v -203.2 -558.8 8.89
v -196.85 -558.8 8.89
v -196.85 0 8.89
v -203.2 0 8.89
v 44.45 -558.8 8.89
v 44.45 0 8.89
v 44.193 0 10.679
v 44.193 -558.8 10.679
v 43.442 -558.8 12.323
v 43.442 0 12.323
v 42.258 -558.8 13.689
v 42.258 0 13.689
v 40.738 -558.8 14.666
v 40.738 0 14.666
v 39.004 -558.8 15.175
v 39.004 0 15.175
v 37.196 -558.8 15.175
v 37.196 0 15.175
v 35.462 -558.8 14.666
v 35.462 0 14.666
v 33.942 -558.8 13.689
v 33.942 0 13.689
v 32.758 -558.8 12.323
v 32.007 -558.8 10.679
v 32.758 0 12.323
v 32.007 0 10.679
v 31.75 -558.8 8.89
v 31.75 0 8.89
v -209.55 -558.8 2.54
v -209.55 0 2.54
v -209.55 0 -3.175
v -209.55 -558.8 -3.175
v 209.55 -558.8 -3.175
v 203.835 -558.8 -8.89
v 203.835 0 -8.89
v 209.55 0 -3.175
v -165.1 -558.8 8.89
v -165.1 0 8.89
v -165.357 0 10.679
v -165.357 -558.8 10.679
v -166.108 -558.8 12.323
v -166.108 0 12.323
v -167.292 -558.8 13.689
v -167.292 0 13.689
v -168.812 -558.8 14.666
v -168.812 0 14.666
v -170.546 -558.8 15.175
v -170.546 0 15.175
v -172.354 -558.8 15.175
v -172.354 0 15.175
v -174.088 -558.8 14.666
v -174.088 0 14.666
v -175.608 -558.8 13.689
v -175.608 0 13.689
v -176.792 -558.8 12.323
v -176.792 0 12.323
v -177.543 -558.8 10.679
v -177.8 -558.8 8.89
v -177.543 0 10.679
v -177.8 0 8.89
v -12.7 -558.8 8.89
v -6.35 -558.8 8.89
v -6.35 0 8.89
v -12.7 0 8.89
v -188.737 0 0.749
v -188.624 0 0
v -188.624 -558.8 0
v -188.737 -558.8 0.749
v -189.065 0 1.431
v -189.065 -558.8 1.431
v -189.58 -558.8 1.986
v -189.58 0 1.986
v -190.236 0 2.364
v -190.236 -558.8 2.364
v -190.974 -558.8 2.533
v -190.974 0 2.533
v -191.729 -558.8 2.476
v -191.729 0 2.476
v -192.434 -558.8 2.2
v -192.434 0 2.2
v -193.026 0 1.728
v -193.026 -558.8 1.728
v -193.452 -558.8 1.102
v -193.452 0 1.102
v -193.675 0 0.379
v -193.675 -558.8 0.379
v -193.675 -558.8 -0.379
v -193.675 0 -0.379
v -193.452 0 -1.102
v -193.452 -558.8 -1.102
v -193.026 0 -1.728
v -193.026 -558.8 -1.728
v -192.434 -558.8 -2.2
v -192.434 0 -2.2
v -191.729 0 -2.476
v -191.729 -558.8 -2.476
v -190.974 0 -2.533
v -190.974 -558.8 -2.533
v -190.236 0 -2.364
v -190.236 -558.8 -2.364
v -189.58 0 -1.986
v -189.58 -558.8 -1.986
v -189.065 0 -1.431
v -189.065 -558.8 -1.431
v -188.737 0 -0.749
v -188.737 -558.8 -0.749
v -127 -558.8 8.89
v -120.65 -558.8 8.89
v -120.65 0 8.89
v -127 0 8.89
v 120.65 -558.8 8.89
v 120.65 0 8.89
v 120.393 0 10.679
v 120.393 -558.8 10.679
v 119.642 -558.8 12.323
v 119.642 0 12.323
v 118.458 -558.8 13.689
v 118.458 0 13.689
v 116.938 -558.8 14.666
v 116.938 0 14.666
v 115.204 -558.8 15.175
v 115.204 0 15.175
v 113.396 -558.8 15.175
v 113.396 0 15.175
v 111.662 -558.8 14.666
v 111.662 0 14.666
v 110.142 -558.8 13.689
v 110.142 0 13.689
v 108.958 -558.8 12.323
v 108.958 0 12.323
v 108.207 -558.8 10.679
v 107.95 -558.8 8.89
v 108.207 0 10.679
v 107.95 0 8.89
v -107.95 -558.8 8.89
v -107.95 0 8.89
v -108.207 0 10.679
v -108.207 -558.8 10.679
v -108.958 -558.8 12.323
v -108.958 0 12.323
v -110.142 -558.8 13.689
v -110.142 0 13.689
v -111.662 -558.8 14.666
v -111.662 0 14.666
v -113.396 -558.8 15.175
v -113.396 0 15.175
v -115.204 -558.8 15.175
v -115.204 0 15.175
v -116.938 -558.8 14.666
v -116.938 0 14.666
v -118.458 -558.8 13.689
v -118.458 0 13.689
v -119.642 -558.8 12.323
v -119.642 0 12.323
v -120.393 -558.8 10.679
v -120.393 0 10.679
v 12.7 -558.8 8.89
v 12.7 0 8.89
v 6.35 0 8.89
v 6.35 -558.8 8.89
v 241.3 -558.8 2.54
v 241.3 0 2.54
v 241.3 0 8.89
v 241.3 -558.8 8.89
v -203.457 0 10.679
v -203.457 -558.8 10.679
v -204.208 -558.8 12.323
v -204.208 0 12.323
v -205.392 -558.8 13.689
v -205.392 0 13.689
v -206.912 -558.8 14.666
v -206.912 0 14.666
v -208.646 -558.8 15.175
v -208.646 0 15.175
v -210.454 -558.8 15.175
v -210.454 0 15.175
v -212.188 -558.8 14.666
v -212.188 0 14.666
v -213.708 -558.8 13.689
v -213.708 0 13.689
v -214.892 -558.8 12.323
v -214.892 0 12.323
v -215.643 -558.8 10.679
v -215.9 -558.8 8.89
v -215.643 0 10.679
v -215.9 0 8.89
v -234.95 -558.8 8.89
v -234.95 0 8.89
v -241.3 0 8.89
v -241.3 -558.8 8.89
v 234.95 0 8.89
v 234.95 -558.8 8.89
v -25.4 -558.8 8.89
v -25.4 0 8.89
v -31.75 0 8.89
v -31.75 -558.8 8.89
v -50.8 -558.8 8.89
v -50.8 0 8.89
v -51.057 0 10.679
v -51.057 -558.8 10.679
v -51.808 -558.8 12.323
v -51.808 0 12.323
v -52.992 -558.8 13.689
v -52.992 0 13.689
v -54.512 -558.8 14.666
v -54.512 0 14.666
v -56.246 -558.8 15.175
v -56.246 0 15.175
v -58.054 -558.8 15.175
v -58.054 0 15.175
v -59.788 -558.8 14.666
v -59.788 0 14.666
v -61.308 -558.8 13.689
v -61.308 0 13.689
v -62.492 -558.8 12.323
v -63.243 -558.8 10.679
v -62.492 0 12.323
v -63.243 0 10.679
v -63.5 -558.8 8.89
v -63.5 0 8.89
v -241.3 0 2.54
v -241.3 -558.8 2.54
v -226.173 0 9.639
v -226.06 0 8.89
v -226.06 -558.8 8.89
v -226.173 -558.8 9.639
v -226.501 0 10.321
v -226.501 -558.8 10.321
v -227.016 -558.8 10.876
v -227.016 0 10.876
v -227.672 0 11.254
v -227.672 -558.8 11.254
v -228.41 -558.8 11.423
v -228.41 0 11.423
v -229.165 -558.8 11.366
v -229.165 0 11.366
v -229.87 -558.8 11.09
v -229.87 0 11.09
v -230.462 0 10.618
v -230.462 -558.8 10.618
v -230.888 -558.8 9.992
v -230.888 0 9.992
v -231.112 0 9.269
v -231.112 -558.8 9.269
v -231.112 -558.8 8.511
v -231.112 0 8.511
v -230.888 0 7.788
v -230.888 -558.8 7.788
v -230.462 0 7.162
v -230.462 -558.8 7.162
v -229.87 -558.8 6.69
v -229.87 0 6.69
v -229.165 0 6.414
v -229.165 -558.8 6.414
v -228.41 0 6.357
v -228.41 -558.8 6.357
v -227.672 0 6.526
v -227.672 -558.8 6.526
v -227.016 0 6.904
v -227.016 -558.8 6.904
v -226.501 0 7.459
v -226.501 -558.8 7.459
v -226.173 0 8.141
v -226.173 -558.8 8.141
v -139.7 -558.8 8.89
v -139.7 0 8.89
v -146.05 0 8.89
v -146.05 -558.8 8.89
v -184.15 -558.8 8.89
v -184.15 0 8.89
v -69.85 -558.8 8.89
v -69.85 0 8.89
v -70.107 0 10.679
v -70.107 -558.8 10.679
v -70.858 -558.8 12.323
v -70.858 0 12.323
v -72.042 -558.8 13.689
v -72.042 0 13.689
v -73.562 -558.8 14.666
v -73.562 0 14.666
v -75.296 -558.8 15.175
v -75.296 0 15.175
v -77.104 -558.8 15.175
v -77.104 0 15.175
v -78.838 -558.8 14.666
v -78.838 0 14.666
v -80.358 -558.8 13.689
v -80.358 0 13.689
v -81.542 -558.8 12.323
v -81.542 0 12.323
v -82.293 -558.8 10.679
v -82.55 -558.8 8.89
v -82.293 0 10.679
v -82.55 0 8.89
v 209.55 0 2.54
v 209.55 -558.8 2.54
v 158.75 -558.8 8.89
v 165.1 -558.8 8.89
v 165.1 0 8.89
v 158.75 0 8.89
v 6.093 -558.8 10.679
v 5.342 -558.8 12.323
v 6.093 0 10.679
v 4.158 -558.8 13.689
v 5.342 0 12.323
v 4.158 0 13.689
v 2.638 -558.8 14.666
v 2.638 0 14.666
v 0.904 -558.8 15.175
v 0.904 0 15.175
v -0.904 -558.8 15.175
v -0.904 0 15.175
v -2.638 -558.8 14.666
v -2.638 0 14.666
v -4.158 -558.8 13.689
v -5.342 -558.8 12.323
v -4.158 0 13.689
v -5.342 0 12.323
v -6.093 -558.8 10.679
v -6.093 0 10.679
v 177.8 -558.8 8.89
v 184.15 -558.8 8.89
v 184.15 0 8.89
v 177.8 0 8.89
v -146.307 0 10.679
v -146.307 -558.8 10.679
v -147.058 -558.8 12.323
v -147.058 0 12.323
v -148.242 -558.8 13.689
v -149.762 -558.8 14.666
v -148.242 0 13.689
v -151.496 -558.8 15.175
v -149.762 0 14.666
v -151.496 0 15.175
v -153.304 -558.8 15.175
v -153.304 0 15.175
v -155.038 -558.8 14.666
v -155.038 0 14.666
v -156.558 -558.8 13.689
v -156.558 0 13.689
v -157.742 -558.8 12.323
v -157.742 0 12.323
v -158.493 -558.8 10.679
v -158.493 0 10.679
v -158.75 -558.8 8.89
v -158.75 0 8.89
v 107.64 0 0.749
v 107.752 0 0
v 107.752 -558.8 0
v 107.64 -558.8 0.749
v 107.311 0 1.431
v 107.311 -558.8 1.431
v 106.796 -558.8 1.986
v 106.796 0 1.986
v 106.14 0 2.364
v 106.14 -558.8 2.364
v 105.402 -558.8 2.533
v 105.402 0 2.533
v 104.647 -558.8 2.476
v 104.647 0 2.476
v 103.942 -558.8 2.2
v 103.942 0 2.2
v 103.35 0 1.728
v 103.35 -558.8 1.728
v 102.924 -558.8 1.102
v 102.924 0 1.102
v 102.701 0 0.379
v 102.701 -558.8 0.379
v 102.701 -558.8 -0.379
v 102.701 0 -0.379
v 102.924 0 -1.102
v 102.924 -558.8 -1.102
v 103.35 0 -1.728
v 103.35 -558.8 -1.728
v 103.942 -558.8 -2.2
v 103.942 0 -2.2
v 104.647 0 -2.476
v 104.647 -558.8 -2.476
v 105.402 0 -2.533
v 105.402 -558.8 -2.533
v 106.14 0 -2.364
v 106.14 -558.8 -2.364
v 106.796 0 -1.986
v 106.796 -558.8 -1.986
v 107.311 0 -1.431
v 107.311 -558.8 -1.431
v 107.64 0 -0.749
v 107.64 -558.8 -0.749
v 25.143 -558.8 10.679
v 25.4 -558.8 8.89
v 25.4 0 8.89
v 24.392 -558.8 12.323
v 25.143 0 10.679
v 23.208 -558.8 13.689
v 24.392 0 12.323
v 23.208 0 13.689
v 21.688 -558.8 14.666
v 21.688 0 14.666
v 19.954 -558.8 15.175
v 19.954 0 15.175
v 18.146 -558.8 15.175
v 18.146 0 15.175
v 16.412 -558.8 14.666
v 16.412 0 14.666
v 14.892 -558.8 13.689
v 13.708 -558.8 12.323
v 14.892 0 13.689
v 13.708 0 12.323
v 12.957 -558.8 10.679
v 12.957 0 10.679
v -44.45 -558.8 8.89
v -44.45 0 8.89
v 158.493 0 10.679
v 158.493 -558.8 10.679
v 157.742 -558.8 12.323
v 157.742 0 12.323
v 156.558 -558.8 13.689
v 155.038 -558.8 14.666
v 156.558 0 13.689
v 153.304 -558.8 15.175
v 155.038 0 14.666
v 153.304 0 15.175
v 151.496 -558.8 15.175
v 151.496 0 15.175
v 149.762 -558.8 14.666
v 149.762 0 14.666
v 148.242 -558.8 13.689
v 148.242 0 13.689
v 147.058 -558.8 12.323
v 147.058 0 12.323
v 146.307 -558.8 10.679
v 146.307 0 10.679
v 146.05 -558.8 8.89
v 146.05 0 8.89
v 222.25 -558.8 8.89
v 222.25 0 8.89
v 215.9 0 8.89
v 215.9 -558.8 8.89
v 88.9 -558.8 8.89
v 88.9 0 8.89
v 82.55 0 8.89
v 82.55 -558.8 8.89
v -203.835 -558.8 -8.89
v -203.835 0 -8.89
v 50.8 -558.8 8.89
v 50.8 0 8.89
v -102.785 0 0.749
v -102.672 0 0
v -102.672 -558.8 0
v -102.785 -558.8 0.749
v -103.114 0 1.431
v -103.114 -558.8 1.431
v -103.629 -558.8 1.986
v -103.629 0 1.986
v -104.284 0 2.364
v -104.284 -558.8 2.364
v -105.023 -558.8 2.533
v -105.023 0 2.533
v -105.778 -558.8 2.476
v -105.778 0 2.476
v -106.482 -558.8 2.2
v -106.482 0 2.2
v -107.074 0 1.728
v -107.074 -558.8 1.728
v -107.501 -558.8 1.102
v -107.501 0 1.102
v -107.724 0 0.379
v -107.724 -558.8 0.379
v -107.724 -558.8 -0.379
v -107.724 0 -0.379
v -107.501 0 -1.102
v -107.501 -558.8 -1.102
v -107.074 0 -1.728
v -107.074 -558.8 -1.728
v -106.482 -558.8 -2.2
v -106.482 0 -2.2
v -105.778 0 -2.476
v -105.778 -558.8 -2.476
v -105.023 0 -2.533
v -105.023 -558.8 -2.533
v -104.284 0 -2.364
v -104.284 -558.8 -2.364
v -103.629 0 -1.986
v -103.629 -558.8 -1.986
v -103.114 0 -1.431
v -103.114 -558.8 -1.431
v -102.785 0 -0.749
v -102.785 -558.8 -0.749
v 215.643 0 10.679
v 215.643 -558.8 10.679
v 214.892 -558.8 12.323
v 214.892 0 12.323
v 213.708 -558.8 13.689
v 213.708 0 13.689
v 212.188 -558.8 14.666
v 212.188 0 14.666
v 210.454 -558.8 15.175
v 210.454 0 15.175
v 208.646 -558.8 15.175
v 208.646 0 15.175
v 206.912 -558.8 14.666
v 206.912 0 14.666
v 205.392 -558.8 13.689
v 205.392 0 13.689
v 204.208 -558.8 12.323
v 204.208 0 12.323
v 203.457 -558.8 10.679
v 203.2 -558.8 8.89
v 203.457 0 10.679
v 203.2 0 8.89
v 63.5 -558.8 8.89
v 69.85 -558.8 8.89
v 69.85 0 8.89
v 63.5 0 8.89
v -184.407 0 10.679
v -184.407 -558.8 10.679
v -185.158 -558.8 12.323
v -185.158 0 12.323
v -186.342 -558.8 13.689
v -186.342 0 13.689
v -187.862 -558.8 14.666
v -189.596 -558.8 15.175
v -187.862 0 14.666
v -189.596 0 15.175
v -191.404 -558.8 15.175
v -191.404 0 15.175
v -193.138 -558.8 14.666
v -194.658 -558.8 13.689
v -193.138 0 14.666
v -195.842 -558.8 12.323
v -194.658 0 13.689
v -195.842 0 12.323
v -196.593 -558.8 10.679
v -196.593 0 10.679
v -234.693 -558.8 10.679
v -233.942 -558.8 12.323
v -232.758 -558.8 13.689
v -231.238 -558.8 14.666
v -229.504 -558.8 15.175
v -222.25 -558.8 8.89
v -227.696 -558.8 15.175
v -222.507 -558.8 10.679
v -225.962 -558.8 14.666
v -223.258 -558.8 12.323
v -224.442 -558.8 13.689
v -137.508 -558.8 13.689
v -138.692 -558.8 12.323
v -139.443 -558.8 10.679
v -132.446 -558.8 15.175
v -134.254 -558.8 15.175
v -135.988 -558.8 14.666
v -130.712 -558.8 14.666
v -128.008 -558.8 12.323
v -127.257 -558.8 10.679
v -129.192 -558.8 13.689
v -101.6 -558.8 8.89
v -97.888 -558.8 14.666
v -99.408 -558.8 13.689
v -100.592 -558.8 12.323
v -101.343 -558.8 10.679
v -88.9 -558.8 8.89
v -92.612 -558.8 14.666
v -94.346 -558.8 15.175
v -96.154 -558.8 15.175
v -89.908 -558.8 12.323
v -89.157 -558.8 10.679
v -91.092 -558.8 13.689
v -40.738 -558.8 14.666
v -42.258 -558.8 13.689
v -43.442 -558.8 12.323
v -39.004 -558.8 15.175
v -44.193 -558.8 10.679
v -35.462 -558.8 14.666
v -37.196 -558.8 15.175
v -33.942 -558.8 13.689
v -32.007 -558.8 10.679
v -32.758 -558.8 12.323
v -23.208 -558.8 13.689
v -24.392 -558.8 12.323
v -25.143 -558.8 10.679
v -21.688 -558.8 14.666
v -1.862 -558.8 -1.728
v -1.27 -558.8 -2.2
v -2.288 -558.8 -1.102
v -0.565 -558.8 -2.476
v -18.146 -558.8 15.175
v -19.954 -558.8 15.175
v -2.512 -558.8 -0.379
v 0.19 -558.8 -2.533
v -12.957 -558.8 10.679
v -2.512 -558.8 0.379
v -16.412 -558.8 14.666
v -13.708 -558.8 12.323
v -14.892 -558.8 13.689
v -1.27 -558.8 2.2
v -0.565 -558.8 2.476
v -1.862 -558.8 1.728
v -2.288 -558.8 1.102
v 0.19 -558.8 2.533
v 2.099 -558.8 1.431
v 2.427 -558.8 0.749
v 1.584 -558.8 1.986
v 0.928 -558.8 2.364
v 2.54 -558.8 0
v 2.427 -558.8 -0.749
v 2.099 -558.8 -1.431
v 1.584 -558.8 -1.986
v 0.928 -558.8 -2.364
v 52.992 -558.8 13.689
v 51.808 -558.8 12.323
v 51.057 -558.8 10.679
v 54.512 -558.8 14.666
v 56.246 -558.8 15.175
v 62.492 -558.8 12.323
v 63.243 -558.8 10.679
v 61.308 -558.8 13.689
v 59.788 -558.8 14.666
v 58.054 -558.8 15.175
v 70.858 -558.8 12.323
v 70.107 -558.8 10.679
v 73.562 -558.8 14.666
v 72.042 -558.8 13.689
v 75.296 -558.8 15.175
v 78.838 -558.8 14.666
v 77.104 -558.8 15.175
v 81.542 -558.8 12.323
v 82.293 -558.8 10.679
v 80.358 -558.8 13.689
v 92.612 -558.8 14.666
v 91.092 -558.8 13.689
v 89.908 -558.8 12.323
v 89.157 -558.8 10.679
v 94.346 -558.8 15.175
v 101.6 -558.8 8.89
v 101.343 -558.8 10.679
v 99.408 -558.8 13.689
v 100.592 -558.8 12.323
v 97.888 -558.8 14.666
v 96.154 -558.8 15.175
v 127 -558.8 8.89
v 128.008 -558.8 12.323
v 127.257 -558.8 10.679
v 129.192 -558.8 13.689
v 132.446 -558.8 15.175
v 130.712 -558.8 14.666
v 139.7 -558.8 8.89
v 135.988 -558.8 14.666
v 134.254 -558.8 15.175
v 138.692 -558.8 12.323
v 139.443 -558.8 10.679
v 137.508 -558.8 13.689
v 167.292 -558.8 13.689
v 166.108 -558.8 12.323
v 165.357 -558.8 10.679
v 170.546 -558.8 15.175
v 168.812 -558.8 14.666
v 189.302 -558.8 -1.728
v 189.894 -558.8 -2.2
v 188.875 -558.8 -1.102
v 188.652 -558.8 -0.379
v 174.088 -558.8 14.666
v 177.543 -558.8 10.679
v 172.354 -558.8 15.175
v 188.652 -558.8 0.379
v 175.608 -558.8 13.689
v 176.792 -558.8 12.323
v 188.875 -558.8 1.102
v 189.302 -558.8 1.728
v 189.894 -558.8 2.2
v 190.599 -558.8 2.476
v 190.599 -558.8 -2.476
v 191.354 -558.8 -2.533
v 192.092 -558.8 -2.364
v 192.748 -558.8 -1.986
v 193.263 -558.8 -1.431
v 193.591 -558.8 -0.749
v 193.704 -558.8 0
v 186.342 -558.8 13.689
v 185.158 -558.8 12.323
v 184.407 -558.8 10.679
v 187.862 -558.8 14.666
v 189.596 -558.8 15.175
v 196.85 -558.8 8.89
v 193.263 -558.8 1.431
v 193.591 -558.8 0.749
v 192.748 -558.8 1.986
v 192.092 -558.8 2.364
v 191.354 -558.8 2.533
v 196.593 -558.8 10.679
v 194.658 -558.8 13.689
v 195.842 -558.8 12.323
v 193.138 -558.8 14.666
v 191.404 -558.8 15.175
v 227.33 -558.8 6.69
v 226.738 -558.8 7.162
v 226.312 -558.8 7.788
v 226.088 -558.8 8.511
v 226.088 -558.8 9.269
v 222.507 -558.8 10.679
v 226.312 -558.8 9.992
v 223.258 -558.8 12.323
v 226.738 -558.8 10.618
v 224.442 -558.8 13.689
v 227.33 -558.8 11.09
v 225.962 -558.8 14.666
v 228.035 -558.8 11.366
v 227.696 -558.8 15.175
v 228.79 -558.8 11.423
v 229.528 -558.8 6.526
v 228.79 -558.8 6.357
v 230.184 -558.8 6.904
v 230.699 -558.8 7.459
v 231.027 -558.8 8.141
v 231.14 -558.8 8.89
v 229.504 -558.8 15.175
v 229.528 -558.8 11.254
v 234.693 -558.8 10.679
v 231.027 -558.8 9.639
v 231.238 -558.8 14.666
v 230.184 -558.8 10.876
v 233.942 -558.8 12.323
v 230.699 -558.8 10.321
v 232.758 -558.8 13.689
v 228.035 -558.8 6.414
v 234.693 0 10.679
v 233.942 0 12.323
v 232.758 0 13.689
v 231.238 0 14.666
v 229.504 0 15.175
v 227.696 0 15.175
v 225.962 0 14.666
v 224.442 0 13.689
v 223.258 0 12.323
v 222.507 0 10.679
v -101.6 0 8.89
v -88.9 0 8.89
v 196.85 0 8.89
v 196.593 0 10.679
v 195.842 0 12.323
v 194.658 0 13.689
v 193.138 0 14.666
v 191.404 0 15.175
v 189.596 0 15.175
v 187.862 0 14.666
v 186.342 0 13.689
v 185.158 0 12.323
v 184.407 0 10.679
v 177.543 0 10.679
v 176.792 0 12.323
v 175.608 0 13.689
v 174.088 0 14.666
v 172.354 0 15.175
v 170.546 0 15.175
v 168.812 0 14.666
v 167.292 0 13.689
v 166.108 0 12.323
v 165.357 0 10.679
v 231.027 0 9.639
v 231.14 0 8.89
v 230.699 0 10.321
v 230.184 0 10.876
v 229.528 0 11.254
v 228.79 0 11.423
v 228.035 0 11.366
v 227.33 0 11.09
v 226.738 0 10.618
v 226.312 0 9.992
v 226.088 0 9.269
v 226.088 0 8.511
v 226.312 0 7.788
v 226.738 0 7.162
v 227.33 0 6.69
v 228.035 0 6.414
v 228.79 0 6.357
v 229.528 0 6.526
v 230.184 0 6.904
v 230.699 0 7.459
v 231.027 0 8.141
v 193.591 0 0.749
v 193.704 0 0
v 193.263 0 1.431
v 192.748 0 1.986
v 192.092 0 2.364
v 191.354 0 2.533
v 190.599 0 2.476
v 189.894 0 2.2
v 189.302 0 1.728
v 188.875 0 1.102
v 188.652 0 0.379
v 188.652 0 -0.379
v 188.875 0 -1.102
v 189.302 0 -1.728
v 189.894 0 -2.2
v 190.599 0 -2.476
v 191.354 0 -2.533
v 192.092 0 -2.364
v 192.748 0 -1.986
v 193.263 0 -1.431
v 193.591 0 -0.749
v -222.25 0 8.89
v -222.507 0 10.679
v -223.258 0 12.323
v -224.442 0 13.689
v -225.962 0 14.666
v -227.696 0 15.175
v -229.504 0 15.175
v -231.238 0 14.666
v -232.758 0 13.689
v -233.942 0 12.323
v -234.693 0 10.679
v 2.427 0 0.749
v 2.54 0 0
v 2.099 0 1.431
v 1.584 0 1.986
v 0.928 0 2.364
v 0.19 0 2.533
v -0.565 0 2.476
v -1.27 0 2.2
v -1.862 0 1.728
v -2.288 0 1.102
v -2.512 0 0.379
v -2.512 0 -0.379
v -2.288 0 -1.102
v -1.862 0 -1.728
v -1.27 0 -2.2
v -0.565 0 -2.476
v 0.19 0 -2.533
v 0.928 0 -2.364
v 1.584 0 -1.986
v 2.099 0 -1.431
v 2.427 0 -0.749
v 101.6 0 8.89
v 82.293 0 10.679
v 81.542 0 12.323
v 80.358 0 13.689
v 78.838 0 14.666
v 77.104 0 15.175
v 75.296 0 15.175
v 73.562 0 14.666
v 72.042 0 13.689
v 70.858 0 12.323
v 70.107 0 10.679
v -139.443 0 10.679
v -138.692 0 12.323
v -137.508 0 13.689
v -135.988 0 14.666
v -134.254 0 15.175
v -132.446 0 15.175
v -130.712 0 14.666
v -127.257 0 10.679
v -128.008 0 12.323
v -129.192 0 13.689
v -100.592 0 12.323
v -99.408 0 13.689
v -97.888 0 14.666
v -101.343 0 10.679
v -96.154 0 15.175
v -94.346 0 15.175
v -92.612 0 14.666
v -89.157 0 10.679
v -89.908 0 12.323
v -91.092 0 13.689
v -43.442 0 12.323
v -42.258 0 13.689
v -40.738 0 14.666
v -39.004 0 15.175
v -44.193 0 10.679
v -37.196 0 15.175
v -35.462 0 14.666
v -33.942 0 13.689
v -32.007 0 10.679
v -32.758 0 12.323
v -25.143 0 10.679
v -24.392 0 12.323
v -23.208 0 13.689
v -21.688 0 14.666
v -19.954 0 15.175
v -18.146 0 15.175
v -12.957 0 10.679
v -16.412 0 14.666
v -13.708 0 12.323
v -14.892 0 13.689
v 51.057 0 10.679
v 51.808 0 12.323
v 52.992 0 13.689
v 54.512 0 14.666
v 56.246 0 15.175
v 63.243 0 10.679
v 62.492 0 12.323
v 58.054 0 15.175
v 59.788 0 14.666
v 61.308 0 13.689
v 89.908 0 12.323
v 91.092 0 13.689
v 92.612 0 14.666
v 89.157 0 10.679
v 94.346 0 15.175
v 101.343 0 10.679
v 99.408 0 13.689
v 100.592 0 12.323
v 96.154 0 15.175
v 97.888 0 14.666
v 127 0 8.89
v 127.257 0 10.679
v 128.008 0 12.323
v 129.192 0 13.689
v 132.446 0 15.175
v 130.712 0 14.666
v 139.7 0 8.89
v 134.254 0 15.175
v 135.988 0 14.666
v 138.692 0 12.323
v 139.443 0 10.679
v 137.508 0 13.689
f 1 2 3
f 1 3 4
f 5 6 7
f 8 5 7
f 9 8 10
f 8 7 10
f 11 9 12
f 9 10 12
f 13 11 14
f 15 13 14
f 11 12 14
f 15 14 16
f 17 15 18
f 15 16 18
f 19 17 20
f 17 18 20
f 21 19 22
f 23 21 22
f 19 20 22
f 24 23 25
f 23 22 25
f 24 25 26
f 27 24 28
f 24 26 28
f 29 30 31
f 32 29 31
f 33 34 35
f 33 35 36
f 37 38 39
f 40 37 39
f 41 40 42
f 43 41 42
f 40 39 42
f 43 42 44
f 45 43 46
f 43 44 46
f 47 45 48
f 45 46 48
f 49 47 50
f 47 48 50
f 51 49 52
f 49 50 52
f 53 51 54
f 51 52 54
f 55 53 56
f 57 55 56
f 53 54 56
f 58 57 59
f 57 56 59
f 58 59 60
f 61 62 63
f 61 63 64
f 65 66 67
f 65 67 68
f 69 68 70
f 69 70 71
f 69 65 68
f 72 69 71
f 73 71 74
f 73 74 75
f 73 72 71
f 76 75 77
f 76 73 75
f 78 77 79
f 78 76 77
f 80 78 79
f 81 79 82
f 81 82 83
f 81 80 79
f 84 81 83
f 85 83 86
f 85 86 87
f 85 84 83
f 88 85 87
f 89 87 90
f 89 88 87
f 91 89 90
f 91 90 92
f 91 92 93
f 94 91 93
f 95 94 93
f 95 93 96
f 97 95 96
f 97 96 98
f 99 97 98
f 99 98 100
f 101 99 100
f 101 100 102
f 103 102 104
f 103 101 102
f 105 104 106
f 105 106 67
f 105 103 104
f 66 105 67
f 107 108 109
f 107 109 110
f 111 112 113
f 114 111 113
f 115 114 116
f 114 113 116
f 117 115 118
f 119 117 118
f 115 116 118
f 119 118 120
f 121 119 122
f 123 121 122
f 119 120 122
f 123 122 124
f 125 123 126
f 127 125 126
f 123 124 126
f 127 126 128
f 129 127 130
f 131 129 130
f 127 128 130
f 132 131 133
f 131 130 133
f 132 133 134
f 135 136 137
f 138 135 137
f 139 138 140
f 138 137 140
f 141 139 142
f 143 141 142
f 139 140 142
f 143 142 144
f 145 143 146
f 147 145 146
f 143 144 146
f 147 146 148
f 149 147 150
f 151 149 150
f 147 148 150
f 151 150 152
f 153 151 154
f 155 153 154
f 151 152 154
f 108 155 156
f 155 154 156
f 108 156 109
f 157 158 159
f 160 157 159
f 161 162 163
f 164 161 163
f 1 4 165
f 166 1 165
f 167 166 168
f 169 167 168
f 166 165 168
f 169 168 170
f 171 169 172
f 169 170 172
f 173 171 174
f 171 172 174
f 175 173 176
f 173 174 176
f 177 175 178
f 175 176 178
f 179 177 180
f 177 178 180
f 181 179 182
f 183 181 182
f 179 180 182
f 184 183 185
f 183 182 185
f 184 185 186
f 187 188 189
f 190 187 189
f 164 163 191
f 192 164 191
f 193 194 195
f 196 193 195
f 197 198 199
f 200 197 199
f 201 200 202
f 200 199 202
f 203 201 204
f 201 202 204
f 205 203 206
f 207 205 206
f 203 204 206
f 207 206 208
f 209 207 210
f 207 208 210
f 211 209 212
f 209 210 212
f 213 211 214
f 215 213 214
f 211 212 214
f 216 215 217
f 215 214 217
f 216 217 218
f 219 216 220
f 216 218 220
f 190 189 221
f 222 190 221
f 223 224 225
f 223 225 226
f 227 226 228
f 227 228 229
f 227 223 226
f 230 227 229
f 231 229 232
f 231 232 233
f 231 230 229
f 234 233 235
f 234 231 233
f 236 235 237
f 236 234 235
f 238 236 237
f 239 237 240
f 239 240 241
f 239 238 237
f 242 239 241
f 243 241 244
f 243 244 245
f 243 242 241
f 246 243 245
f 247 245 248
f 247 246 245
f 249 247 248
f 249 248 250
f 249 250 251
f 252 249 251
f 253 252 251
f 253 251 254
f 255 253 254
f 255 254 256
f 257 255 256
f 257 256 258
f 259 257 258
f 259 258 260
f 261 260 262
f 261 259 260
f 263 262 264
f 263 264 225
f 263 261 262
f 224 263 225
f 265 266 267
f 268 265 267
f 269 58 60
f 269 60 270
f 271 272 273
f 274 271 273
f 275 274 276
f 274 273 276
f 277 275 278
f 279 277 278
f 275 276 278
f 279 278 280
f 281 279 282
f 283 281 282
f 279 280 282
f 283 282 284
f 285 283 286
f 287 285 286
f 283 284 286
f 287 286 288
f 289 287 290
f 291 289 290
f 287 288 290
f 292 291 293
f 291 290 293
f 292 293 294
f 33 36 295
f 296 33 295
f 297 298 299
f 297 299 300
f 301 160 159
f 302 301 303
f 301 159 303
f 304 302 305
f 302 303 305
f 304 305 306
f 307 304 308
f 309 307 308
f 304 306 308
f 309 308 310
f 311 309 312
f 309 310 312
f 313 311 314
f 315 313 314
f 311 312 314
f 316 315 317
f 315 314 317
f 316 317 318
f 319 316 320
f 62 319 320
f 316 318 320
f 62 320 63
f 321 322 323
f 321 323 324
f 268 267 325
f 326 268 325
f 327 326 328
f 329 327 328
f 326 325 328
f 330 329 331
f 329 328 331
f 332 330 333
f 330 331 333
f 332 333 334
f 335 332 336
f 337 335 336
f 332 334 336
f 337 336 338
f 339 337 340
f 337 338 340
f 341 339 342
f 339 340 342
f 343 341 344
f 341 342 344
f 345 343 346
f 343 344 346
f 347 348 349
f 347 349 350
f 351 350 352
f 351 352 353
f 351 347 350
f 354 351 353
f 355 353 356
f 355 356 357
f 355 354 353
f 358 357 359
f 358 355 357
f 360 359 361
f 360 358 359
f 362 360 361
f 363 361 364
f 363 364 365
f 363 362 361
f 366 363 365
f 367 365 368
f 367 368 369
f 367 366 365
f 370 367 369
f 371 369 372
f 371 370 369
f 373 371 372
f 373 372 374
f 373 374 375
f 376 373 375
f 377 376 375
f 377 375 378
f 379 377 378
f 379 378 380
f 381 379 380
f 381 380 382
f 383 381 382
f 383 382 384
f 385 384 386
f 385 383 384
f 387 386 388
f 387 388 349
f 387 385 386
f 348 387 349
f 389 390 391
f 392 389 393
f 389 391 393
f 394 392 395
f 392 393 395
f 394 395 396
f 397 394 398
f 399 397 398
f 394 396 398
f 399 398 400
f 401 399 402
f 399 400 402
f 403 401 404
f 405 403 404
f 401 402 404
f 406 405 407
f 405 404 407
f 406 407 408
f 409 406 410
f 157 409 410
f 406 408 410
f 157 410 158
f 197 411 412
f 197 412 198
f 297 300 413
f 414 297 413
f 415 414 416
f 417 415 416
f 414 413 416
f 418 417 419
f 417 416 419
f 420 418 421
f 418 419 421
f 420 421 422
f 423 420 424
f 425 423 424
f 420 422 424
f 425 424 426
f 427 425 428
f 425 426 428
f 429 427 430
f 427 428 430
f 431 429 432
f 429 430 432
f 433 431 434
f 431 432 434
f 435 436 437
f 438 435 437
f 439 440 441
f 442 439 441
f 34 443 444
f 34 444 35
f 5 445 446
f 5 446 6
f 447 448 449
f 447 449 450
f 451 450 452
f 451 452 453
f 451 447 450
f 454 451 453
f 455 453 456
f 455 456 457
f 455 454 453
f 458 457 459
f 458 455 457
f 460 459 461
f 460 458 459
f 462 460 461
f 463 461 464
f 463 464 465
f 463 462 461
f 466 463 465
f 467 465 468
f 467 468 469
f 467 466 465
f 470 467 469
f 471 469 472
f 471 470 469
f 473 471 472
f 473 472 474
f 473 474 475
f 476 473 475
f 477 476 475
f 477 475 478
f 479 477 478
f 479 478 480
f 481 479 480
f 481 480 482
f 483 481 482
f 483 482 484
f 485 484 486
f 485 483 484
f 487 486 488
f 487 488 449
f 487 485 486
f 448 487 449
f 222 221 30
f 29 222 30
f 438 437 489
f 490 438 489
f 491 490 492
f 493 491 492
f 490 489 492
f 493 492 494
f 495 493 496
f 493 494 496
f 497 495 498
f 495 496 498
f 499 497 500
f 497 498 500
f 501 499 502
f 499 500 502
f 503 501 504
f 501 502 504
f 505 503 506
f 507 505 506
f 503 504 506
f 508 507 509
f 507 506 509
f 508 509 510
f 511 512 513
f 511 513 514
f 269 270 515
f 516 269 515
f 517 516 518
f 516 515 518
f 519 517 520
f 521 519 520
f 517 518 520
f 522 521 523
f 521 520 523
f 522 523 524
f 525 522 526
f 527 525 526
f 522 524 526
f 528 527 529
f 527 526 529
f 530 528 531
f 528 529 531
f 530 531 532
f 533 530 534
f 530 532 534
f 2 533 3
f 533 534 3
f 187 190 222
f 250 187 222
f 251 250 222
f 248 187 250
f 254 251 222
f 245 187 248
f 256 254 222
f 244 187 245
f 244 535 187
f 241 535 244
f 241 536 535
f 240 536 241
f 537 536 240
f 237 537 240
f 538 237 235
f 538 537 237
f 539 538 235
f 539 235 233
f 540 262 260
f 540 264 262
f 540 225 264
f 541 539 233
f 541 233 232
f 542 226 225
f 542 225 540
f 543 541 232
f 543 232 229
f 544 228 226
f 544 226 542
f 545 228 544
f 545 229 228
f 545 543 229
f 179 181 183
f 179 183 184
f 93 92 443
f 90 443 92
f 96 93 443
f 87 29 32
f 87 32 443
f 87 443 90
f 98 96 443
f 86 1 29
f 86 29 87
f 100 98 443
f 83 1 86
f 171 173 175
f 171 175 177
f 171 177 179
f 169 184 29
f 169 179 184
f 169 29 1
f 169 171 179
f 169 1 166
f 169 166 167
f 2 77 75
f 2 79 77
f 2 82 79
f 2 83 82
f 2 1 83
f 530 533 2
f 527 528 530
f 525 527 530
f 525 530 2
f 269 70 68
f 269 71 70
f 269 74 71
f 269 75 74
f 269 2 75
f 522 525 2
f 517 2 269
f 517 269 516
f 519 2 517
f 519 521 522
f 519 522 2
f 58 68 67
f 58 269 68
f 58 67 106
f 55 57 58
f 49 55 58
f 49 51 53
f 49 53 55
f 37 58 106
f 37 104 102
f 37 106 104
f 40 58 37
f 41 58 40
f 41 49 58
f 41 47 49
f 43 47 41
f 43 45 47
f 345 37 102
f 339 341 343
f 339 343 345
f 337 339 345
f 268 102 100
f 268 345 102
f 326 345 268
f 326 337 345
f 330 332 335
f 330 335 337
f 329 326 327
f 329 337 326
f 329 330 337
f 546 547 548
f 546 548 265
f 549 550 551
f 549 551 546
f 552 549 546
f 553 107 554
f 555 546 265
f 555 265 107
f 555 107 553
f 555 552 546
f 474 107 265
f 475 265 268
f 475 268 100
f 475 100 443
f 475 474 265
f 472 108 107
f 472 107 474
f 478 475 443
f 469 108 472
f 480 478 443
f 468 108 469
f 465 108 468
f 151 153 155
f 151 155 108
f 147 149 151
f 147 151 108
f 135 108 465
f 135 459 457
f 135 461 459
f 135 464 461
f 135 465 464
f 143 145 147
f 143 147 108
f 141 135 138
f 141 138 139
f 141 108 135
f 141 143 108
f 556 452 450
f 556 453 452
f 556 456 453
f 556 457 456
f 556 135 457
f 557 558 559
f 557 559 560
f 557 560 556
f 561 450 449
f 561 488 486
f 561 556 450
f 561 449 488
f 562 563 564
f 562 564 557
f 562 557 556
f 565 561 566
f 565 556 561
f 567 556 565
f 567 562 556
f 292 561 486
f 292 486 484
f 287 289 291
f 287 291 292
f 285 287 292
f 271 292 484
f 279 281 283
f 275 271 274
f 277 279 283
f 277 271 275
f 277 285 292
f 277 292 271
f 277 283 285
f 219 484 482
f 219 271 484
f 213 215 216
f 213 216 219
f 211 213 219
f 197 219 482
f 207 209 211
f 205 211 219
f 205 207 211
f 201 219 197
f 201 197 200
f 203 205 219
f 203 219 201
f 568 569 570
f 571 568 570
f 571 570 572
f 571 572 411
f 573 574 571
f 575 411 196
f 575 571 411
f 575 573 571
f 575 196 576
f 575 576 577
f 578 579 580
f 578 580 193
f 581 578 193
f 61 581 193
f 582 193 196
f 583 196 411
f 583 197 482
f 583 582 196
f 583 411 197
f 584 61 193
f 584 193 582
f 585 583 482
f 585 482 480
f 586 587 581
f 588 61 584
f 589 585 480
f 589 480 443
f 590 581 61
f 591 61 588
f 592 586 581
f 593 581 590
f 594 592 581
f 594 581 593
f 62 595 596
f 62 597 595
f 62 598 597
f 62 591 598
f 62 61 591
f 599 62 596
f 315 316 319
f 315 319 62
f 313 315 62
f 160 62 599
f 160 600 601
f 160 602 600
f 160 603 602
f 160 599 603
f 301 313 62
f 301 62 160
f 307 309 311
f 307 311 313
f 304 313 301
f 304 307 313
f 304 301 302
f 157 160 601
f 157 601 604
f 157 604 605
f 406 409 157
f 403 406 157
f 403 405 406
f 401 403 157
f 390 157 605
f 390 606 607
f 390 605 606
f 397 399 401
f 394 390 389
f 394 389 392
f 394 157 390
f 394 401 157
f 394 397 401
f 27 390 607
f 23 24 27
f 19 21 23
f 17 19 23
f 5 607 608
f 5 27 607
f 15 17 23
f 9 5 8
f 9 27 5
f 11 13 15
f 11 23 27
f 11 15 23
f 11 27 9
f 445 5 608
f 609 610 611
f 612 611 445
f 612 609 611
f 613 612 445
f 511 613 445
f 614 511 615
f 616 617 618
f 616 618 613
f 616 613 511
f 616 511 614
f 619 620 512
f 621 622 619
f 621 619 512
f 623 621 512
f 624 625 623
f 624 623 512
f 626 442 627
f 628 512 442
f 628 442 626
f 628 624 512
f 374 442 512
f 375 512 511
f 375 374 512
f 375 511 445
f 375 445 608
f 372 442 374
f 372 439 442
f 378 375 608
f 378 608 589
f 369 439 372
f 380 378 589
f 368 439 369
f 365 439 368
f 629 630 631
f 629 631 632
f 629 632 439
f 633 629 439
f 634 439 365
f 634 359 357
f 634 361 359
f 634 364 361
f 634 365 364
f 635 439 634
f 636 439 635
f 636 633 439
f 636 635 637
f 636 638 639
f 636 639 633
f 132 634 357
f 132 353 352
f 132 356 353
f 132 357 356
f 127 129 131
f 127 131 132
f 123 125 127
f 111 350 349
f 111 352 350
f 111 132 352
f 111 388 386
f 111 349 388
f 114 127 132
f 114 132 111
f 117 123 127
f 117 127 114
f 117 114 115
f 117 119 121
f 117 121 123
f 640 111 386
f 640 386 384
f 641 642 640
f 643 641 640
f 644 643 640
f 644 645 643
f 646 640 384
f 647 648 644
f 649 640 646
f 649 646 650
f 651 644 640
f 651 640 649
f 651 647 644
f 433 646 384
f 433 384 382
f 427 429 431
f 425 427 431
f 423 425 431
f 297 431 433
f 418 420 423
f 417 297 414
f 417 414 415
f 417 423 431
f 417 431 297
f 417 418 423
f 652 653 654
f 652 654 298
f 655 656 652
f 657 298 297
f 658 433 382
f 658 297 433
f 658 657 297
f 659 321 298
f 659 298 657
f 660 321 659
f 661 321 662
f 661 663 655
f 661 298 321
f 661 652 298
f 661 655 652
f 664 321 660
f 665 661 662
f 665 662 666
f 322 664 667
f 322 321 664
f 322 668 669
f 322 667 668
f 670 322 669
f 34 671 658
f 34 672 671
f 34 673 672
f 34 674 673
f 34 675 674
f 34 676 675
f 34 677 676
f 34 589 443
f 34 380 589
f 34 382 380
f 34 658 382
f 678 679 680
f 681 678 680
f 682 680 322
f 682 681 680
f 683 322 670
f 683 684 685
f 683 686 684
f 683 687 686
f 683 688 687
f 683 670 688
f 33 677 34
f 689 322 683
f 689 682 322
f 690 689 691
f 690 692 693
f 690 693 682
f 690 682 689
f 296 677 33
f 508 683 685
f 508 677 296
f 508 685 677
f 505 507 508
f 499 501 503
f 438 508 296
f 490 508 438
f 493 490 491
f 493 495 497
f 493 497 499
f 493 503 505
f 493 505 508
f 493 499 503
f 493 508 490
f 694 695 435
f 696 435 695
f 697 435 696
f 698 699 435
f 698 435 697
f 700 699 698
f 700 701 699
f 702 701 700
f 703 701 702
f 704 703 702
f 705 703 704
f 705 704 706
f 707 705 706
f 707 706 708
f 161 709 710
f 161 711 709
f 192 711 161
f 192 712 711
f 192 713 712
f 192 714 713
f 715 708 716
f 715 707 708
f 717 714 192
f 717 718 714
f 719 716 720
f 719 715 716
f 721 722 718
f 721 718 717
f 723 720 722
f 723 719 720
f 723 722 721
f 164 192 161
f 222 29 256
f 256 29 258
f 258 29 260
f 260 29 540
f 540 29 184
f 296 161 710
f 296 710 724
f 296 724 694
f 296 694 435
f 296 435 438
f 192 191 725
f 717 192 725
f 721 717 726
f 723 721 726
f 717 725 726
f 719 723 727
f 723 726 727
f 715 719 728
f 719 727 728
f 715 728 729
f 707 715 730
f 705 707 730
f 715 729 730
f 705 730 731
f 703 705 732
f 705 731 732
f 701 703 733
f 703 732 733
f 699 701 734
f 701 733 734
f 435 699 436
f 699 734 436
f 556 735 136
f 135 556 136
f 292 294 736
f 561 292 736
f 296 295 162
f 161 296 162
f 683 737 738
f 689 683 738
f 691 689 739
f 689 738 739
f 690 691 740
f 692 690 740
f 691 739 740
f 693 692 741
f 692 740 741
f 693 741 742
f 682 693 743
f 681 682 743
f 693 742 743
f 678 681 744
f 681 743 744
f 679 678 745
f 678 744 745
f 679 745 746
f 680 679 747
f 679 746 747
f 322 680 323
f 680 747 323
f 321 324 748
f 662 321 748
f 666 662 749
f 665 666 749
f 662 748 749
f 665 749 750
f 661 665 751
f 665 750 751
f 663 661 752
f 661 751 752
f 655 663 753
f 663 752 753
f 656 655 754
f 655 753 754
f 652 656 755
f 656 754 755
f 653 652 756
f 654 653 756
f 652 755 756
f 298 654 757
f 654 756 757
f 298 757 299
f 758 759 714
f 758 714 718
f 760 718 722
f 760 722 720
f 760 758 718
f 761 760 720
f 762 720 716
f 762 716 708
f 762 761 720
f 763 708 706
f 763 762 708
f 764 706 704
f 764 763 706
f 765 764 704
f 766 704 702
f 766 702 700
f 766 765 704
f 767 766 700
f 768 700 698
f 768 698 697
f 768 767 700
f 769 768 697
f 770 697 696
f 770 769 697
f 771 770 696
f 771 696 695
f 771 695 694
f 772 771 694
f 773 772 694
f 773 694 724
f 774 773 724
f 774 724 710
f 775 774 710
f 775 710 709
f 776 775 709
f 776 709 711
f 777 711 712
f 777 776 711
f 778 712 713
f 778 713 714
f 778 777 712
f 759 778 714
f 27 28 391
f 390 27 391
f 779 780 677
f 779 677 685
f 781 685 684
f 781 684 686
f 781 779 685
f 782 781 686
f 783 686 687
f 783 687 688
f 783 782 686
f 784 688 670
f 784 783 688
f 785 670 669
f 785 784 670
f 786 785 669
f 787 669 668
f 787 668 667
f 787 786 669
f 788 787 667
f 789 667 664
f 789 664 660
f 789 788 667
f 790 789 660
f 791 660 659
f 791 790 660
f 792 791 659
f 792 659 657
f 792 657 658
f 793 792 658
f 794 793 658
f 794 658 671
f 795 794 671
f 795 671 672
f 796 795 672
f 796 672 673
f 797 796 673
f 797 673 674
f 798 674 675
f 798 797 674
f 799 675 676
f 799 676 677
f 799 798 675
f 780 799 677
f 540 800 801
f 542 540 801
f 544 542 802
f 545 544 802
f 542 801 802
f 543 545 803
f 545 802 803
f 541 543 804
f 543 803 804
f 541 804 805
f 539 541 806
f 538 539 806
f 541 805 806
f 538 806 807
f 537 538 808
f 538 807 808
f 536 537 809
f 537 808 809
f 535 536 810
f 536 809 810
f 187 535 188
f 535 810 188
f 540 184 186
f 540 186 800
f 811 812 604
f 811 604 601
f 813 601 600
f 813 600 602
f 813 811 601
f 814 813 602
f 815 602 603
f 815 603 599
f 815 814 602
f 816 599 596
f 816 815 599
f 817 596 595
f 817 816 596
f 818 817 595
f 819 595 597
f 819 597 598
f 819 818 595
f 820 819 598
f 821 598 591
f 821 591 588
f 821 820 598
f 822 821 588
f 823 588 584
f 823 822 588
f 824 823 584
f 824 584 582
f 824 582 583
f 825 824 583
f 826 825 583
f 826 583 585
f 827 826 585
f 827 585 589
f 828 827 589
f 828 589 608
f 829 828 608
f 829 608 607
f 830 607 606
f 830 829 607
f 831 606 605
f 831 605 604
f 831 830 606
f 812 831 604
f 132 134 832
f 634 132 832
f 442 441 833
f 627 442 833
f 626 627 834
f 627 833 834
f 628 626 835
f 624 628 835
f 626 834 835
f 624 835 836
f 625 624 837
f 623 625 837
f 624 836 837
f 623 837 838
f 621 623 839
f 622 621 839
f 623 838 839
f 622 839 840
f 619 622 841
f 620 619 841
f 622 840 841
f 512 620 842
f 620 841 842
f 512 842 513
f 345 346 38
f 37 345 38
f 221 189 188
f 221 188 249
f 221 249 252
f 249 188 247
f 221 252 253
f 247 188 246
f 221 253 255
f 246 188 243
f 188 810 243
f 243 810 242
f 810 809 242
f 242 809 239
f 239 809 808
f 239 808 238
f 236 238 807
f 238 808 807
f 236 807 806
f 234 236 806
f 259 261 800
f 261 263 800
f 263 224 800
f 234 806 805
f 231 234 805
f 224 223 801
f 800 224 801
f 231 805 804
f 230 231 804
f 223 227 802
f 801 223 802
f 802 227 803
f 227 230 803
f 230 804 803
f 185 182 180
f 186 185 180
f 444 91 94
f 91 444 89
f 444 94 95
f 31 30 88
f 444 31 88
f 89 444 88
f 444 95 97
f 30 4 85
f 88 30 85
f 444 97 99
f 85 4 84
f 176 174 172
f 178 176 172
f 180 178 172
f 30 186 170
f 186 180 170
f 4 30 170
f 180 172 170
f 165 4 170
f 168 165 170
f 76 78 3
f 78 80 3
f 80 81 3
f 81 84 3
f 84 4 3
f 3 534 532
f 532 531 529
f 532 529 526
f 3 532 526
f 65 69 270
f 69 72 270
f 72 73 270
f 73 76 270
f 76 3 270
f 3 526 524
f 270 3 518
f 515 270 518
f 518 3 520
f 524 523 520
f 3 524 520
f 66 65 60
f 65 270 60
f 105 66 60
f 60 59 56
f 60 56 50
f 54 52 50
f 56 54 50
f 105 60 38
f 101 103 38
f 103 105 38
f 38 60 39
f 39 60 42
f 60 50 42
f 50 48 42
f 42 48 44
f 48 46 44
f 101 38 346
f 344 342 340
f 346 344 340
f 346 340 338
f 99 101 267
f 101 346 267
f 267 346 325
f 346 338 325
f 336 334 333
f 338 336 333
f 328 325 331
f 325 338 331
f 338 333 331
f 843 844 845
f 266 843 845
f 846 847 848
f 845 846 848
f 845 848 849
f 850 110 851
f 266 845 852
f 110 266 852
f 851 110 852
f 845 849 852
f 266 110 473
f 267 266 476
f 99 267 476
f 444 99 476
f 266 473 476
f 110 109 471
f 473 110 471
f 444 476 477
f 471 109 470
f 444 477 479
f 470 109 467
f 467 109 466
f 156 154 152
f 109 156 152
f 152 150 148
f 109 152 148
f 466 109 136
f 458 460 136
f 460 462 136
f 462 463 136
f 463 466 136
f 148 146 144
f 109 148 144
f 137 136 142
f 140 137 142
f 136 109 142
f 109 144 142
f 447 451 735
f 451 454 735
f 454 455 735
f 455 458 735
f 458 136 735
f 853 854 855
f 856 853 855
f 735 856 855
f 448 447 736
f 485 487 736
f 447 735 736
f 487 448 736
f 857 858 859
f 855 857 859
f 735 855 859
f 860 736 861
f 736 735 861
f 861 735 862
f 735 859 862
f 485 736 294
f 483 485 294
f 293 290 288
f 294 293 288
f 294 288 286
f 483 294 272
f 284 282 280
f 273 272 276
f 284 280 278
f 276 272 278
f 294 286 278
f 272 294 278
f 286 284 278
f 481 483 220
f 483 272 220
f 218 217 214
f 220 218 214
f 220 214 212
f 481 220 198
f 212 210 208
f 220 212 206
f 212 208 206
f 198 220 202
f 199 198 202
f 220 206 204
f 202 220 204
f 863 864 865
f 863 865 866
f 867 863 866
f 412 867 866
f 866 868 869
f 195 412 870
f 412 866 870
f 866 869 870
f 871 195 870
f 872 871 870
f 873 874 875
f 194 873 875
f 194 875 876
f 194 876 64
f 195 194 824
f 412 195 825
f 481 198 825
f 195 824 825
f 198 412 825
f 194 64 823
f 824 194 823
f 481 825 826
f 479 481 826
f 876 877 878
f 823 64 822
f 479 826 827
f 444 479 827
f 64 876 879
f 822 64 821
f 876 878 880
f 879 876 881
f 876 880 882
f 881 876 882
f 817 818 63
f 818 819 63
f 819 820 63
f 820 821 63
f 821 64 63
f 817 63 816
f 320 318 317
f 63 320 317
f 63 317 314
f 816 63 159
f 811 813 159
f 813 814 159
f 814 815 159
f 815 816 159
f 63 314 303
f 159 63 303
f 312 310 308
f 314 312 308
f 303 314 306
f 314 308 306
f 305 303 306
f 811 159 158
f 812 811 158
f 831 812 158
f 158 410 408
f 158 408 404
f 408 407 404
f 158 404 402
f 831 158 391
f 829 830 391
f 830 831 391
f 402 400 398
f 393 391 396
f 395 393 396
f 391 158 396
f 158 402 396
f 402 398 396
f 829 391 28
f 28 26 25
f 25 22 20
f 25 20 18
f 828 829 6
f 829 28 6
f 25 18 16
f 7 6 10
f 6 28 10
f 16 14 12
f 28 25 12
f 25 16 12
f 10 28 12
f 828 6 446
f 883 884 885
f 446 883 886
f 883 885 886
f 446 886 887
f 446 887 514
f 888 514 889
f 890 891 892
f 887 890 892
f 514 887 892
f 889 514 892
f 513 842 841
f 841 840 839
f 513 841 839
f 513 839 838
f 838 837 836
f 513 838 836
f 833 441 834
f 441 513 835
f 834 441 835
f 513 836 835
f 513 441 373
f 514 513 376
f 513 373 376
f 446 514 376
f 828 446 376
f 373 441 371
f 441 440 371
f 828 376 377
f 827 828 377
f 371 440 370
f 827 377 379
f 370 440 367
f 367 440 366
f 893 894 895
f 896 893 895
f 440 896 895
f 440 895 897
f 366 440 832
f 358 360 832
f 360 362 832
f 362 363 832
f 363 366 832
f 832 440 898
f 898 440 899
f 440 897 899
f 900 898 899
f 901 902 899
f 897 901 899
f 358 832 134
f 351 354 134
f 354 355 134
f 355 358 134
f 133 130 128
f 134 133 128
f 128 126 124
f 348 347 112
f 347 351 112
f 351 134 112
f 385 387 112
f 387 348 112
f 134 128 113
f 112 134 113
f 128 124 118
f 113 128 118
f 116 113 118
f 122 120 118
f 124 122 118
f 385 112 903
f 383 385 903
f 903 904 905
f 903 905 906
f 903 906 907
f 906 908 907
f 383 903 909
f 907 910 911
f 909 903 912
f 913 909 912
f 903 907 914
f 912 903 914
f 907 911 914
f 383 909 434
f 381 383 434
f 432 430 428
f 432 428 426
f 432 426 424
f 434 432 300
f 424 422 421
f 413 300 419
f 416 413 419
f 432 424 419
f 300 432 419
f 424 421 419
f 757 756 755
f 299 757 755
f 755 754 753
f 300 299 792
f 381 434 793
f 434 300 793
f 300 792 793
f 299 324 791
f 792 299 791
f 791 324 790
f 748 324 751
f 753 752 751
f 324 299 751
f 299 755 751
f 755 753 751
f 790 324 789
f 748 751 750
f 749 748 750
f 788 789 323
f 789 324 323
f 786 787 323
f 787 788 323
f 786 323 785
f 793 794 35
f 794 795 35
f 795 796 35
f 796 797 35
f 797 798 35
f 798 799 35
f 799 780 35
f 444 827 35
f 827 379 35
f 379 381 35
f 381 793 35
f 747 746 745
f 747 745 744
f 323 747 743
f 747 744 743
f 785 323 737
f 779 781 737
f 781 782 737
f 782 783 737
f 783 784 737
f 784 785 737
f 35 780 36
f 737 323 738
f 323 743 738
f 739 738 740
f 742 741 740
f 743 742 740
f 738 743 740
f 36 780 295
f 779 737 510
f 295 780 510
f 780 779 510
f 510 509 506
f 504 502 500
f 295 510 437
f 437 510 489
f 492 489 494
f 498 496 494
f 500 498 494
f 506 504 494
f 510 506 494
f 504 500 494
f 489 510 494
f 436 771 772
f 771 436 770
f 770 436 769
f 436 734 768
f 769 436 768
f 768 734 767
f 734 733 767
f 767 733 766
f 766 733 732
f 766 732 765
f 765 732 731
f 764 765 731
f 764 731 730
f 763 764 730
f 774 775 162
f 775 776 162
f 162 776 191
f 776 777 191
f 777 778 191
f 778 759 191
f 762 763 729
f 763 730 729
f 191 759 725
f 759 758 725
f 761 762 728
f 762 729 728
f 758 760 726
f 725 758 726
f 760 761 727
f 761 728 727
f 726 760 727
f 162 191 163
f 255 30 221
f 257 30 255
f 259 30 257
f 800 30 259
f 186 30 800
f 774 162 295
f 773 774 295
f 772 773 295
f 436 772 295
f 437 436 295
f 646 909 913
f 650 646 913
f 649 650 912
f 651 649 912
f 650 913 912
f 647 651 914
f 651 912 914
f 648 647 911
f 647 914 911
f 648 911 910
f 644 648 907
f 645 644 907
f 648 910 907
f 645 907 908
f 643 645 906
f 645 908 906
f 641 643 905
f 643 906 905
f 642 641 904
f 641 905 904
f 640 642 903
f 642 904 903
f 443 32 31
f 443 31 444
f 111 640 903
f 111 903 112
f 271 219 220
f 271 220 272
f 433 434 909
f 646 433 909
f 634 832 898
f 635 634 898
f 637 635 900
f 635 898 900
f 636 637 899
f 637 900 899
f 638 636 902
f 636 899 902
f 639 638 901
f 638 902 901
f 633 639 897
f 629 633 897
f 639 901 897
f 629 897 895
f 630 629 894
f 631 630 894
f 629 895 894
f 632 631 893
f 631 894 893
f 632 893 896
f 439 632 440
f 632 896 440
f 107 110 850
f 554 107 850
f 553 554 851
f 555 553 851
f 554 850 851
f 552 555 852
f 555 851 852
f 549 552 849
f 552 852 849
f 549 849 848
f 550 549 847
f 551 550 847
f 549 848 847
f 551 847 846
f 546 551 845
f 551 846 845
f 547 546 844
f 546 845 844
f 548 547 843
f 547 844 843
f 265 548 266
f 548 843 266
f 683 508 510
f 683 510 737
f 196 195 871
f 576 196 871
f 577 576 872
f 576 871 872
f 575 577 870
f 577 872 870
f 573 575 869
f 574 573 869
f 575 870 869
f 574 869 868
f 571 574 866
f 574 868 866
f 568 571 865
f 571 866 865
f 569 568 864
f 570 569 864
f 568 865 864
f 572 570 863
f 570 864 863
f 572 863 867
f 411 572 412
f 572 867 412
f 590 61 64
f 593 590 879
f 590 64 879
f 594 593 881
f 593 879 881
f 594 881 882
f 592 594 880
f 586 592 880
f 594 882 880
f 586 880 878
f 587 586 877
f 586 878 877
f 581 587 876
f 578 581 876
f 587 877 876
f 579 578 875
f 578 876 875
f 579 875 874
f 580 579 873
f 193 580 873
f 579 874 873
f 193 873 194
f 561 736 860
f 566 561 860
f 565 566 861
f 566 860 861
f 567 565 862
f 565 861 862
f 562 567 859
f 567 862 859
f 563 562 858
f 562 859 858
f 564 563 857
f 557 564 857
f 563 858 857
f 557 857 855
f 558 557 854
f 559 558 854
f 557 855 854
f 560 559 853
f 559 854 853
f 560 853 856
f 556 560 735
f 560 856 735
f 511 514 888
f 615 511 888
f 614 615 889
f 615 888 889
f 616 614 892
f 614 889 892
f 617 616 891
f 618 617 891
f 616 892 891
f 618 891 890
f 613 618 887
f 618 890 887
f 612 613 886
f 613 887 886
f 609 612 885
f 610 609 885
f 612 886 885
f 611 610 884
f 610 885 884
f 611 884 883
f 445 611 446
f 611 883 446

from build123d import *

# Parameters (mm, degrees)
F0_R     = 2.54
F1_DEPTH = 558.8


with BuildPart() as f1:
    # F0 (on Front) → F1 (new body)
    with BuildSketch(Plane.XZ):
        with BuildLine():
            Line((241.299638, 2.54), (241.299638, 8.89))
            Line((241.299638, 8.89), (234.95, 8.89))
            ThreePointArc((234.95, 8.89), (228.6, 15.24), (222.25, 8.89))
            Line((222.25, 8.89), (215.9, 8.89))
            ThreePointArc((215.9, 8.89), (209.55, 15.24), (203.2, 8.89))
            Line((203.2, 8.89), (196.85, 8.89))
            ThreePointArc((196.85, 8.89), (190.5, 15.24), (184.15, 8.89))
            Line((184.15, 8.89), (177.8, 8.89))
            ThreePointArc((177.8, 8.89), (171.45, 15.24), (165.1, 8.89))
            Line((165.1, 8.89), (158.75, 8.89))
            ThreePointArc((158.75, 8.89), (152.4, 15.24), (146.05, 8.89))
            Line((146.05, 8.89), (139.7, 8.89))
            ThreePointArc((139.7, 8.89), (133.35, 15.24), (127, 8.89))
            Line((127, 8.89), (120.65, 8.89))
            ThreePointArc((120.65, 8.89), (114.3, 15.24), (107.95, 8.89))
            Line((107.95, 8.89), (101.6, 8.89))
            ThreePointArc((101.6, 8.89), (95.25, 15.24), (88.9, 8.89))
            Line((88.9, 8.89), (82.55, 8.89))
            ThreePointArc((82.55, 8.89), (76.2, 15.24), (69.85, 8.89))
            Line((69.85, 8.89), (63.5, 8.89))
            ThreePointArc((63.5, 8.89), (57.15, 15.24), (50.8, 8.89))
            Line((50.8, 8.89), (44.45, 8.89))
            ThreePointArc((44.45, 8.89), (38.1, 15.24), (31.75, 8.89))
            Line((31.75, 8.89), (25.4, 8.89))
            ThreePointArc((25.4, 8.89), (19.05, 15.24), (12.7, 8.89))
            Line((12.7, 8.89), (6.35, 8.89))
            ThreePointArc((6.35, 8.89), (0, 15.24), (-6.35, 8.89))
            Line((-6.35, 8.89), (-12.7, 8.89))
            ThreePointArc((-12.7, 8.89), (-19.05, 15.24), (-25.4, 8.89))
            Line((-25.4, 8.89), (-31.75, 8.89))
            ThreePointArc((-31.75, 8.89), (-38.1, 15.24), (-44.45, 8.89))
            Line((-44.45, 8.89), (-50.8, 8.89))
            ThreePointArc((-50.8, 8.89), (-57.15, 15.24), (-63.5, 8.89))
            Line((-63.5, 8.89), (-69.85, 8.89))
            ThreePointArc((-69.85, 8.89), (-76.2, 15.24), (-82.55, 8.89))
            Line((-82.55, 8.89), (-88.9, 8.89))
            ThreePointArc((-88.9, 8.89), (-95.25, 15.24), (-101.6, 8.89))
            Line((-101.6, 8.89), (-107.95, 8.89))
            ThreePointArc((-107.95, 8.89), (-114.3, 15.24), (-120.65, 8.89))
            Line((-120.65, 8.89), (-127, 8.89))
            ThreePointArc((-127, 8.89), (-133.35, 15.24), (-139.7, 8.89))
            Line((-139.7, 8.89), (-146.05, 8.89))
            ThreePointArc((-146.05, 8.89), (-152.4, 15.24), (-158.75, 8.89))
            Line((-158.75, 8.89), (-165.1, 8.89))
            ThreePointArc((-165.1, 8.89), (-171.45, 15.24), (-177.8, 8.89))
            Line((-177.8, 8.89), (-184.15, 8.89))
            ThreePointArc((-184.15, 8.89), (-190.5, 15.24), (-196.85, 8.89))
            Line((-196.85, 8.89), (-203.2, 8.89))
            ThreePointArc((-203.2, 8.89), (-209.55, 15.24), (-215.9, 8.89))
            Line((-215.9, 8.89), (-222.25, 8.89))
            ThreePointArc((-222.25, 8.89), (-228.6, 15.24), (-234.95, 8.89))
            Line((-234.95, 8.89), (-241.299638, 8.89))
            Line((-241.299638, 8.89), (-241.299638, 2.54))
            Line((-241.299638, 2.54), (-209.55, 2.54))
            Line((-209.55, 2.54), (-209.55, -3.175))
            Line((-209.55, -3.175), (-203.835, -8.89))
            Line((-203.835, -8.89), (203.835, -8.89))
            Line((203.835, -8.89), (209.55, -3.175))
            Line((209.55, -3.175), (209.55, 2.54))
            Line((209.55, 2.54), (241.299638, 2.54))
        make_face()
        with Locations((-191.163868, 0)):
            Circle(F0_R, mode=Mode.SUBTRACT)
        with Locations((-105.212435, 0)):
            Circle(F0_R, mode=Mode.SUBTRACT)
        Circle(F0_R, mode=Mode.SUBTRACT)
        with Locations((105.212435, 0)):
            Circle(F0_R, mode=Mode.SUBTRACT)
        with Locations((191.163868, 0)):
            Circle(F0_R, mode=Mode.SUBTRACT)
        with Locations((-228.6, 8.89)):
            Circle(F0_R, mode=Mode.SUBTRACT)
        with Locations((228.6, 8.89)):
            Circle(F0_R, mode=Mode.SUBTRACT)
    extrude(amount=F1_DEPTH)


solid = f1.part
